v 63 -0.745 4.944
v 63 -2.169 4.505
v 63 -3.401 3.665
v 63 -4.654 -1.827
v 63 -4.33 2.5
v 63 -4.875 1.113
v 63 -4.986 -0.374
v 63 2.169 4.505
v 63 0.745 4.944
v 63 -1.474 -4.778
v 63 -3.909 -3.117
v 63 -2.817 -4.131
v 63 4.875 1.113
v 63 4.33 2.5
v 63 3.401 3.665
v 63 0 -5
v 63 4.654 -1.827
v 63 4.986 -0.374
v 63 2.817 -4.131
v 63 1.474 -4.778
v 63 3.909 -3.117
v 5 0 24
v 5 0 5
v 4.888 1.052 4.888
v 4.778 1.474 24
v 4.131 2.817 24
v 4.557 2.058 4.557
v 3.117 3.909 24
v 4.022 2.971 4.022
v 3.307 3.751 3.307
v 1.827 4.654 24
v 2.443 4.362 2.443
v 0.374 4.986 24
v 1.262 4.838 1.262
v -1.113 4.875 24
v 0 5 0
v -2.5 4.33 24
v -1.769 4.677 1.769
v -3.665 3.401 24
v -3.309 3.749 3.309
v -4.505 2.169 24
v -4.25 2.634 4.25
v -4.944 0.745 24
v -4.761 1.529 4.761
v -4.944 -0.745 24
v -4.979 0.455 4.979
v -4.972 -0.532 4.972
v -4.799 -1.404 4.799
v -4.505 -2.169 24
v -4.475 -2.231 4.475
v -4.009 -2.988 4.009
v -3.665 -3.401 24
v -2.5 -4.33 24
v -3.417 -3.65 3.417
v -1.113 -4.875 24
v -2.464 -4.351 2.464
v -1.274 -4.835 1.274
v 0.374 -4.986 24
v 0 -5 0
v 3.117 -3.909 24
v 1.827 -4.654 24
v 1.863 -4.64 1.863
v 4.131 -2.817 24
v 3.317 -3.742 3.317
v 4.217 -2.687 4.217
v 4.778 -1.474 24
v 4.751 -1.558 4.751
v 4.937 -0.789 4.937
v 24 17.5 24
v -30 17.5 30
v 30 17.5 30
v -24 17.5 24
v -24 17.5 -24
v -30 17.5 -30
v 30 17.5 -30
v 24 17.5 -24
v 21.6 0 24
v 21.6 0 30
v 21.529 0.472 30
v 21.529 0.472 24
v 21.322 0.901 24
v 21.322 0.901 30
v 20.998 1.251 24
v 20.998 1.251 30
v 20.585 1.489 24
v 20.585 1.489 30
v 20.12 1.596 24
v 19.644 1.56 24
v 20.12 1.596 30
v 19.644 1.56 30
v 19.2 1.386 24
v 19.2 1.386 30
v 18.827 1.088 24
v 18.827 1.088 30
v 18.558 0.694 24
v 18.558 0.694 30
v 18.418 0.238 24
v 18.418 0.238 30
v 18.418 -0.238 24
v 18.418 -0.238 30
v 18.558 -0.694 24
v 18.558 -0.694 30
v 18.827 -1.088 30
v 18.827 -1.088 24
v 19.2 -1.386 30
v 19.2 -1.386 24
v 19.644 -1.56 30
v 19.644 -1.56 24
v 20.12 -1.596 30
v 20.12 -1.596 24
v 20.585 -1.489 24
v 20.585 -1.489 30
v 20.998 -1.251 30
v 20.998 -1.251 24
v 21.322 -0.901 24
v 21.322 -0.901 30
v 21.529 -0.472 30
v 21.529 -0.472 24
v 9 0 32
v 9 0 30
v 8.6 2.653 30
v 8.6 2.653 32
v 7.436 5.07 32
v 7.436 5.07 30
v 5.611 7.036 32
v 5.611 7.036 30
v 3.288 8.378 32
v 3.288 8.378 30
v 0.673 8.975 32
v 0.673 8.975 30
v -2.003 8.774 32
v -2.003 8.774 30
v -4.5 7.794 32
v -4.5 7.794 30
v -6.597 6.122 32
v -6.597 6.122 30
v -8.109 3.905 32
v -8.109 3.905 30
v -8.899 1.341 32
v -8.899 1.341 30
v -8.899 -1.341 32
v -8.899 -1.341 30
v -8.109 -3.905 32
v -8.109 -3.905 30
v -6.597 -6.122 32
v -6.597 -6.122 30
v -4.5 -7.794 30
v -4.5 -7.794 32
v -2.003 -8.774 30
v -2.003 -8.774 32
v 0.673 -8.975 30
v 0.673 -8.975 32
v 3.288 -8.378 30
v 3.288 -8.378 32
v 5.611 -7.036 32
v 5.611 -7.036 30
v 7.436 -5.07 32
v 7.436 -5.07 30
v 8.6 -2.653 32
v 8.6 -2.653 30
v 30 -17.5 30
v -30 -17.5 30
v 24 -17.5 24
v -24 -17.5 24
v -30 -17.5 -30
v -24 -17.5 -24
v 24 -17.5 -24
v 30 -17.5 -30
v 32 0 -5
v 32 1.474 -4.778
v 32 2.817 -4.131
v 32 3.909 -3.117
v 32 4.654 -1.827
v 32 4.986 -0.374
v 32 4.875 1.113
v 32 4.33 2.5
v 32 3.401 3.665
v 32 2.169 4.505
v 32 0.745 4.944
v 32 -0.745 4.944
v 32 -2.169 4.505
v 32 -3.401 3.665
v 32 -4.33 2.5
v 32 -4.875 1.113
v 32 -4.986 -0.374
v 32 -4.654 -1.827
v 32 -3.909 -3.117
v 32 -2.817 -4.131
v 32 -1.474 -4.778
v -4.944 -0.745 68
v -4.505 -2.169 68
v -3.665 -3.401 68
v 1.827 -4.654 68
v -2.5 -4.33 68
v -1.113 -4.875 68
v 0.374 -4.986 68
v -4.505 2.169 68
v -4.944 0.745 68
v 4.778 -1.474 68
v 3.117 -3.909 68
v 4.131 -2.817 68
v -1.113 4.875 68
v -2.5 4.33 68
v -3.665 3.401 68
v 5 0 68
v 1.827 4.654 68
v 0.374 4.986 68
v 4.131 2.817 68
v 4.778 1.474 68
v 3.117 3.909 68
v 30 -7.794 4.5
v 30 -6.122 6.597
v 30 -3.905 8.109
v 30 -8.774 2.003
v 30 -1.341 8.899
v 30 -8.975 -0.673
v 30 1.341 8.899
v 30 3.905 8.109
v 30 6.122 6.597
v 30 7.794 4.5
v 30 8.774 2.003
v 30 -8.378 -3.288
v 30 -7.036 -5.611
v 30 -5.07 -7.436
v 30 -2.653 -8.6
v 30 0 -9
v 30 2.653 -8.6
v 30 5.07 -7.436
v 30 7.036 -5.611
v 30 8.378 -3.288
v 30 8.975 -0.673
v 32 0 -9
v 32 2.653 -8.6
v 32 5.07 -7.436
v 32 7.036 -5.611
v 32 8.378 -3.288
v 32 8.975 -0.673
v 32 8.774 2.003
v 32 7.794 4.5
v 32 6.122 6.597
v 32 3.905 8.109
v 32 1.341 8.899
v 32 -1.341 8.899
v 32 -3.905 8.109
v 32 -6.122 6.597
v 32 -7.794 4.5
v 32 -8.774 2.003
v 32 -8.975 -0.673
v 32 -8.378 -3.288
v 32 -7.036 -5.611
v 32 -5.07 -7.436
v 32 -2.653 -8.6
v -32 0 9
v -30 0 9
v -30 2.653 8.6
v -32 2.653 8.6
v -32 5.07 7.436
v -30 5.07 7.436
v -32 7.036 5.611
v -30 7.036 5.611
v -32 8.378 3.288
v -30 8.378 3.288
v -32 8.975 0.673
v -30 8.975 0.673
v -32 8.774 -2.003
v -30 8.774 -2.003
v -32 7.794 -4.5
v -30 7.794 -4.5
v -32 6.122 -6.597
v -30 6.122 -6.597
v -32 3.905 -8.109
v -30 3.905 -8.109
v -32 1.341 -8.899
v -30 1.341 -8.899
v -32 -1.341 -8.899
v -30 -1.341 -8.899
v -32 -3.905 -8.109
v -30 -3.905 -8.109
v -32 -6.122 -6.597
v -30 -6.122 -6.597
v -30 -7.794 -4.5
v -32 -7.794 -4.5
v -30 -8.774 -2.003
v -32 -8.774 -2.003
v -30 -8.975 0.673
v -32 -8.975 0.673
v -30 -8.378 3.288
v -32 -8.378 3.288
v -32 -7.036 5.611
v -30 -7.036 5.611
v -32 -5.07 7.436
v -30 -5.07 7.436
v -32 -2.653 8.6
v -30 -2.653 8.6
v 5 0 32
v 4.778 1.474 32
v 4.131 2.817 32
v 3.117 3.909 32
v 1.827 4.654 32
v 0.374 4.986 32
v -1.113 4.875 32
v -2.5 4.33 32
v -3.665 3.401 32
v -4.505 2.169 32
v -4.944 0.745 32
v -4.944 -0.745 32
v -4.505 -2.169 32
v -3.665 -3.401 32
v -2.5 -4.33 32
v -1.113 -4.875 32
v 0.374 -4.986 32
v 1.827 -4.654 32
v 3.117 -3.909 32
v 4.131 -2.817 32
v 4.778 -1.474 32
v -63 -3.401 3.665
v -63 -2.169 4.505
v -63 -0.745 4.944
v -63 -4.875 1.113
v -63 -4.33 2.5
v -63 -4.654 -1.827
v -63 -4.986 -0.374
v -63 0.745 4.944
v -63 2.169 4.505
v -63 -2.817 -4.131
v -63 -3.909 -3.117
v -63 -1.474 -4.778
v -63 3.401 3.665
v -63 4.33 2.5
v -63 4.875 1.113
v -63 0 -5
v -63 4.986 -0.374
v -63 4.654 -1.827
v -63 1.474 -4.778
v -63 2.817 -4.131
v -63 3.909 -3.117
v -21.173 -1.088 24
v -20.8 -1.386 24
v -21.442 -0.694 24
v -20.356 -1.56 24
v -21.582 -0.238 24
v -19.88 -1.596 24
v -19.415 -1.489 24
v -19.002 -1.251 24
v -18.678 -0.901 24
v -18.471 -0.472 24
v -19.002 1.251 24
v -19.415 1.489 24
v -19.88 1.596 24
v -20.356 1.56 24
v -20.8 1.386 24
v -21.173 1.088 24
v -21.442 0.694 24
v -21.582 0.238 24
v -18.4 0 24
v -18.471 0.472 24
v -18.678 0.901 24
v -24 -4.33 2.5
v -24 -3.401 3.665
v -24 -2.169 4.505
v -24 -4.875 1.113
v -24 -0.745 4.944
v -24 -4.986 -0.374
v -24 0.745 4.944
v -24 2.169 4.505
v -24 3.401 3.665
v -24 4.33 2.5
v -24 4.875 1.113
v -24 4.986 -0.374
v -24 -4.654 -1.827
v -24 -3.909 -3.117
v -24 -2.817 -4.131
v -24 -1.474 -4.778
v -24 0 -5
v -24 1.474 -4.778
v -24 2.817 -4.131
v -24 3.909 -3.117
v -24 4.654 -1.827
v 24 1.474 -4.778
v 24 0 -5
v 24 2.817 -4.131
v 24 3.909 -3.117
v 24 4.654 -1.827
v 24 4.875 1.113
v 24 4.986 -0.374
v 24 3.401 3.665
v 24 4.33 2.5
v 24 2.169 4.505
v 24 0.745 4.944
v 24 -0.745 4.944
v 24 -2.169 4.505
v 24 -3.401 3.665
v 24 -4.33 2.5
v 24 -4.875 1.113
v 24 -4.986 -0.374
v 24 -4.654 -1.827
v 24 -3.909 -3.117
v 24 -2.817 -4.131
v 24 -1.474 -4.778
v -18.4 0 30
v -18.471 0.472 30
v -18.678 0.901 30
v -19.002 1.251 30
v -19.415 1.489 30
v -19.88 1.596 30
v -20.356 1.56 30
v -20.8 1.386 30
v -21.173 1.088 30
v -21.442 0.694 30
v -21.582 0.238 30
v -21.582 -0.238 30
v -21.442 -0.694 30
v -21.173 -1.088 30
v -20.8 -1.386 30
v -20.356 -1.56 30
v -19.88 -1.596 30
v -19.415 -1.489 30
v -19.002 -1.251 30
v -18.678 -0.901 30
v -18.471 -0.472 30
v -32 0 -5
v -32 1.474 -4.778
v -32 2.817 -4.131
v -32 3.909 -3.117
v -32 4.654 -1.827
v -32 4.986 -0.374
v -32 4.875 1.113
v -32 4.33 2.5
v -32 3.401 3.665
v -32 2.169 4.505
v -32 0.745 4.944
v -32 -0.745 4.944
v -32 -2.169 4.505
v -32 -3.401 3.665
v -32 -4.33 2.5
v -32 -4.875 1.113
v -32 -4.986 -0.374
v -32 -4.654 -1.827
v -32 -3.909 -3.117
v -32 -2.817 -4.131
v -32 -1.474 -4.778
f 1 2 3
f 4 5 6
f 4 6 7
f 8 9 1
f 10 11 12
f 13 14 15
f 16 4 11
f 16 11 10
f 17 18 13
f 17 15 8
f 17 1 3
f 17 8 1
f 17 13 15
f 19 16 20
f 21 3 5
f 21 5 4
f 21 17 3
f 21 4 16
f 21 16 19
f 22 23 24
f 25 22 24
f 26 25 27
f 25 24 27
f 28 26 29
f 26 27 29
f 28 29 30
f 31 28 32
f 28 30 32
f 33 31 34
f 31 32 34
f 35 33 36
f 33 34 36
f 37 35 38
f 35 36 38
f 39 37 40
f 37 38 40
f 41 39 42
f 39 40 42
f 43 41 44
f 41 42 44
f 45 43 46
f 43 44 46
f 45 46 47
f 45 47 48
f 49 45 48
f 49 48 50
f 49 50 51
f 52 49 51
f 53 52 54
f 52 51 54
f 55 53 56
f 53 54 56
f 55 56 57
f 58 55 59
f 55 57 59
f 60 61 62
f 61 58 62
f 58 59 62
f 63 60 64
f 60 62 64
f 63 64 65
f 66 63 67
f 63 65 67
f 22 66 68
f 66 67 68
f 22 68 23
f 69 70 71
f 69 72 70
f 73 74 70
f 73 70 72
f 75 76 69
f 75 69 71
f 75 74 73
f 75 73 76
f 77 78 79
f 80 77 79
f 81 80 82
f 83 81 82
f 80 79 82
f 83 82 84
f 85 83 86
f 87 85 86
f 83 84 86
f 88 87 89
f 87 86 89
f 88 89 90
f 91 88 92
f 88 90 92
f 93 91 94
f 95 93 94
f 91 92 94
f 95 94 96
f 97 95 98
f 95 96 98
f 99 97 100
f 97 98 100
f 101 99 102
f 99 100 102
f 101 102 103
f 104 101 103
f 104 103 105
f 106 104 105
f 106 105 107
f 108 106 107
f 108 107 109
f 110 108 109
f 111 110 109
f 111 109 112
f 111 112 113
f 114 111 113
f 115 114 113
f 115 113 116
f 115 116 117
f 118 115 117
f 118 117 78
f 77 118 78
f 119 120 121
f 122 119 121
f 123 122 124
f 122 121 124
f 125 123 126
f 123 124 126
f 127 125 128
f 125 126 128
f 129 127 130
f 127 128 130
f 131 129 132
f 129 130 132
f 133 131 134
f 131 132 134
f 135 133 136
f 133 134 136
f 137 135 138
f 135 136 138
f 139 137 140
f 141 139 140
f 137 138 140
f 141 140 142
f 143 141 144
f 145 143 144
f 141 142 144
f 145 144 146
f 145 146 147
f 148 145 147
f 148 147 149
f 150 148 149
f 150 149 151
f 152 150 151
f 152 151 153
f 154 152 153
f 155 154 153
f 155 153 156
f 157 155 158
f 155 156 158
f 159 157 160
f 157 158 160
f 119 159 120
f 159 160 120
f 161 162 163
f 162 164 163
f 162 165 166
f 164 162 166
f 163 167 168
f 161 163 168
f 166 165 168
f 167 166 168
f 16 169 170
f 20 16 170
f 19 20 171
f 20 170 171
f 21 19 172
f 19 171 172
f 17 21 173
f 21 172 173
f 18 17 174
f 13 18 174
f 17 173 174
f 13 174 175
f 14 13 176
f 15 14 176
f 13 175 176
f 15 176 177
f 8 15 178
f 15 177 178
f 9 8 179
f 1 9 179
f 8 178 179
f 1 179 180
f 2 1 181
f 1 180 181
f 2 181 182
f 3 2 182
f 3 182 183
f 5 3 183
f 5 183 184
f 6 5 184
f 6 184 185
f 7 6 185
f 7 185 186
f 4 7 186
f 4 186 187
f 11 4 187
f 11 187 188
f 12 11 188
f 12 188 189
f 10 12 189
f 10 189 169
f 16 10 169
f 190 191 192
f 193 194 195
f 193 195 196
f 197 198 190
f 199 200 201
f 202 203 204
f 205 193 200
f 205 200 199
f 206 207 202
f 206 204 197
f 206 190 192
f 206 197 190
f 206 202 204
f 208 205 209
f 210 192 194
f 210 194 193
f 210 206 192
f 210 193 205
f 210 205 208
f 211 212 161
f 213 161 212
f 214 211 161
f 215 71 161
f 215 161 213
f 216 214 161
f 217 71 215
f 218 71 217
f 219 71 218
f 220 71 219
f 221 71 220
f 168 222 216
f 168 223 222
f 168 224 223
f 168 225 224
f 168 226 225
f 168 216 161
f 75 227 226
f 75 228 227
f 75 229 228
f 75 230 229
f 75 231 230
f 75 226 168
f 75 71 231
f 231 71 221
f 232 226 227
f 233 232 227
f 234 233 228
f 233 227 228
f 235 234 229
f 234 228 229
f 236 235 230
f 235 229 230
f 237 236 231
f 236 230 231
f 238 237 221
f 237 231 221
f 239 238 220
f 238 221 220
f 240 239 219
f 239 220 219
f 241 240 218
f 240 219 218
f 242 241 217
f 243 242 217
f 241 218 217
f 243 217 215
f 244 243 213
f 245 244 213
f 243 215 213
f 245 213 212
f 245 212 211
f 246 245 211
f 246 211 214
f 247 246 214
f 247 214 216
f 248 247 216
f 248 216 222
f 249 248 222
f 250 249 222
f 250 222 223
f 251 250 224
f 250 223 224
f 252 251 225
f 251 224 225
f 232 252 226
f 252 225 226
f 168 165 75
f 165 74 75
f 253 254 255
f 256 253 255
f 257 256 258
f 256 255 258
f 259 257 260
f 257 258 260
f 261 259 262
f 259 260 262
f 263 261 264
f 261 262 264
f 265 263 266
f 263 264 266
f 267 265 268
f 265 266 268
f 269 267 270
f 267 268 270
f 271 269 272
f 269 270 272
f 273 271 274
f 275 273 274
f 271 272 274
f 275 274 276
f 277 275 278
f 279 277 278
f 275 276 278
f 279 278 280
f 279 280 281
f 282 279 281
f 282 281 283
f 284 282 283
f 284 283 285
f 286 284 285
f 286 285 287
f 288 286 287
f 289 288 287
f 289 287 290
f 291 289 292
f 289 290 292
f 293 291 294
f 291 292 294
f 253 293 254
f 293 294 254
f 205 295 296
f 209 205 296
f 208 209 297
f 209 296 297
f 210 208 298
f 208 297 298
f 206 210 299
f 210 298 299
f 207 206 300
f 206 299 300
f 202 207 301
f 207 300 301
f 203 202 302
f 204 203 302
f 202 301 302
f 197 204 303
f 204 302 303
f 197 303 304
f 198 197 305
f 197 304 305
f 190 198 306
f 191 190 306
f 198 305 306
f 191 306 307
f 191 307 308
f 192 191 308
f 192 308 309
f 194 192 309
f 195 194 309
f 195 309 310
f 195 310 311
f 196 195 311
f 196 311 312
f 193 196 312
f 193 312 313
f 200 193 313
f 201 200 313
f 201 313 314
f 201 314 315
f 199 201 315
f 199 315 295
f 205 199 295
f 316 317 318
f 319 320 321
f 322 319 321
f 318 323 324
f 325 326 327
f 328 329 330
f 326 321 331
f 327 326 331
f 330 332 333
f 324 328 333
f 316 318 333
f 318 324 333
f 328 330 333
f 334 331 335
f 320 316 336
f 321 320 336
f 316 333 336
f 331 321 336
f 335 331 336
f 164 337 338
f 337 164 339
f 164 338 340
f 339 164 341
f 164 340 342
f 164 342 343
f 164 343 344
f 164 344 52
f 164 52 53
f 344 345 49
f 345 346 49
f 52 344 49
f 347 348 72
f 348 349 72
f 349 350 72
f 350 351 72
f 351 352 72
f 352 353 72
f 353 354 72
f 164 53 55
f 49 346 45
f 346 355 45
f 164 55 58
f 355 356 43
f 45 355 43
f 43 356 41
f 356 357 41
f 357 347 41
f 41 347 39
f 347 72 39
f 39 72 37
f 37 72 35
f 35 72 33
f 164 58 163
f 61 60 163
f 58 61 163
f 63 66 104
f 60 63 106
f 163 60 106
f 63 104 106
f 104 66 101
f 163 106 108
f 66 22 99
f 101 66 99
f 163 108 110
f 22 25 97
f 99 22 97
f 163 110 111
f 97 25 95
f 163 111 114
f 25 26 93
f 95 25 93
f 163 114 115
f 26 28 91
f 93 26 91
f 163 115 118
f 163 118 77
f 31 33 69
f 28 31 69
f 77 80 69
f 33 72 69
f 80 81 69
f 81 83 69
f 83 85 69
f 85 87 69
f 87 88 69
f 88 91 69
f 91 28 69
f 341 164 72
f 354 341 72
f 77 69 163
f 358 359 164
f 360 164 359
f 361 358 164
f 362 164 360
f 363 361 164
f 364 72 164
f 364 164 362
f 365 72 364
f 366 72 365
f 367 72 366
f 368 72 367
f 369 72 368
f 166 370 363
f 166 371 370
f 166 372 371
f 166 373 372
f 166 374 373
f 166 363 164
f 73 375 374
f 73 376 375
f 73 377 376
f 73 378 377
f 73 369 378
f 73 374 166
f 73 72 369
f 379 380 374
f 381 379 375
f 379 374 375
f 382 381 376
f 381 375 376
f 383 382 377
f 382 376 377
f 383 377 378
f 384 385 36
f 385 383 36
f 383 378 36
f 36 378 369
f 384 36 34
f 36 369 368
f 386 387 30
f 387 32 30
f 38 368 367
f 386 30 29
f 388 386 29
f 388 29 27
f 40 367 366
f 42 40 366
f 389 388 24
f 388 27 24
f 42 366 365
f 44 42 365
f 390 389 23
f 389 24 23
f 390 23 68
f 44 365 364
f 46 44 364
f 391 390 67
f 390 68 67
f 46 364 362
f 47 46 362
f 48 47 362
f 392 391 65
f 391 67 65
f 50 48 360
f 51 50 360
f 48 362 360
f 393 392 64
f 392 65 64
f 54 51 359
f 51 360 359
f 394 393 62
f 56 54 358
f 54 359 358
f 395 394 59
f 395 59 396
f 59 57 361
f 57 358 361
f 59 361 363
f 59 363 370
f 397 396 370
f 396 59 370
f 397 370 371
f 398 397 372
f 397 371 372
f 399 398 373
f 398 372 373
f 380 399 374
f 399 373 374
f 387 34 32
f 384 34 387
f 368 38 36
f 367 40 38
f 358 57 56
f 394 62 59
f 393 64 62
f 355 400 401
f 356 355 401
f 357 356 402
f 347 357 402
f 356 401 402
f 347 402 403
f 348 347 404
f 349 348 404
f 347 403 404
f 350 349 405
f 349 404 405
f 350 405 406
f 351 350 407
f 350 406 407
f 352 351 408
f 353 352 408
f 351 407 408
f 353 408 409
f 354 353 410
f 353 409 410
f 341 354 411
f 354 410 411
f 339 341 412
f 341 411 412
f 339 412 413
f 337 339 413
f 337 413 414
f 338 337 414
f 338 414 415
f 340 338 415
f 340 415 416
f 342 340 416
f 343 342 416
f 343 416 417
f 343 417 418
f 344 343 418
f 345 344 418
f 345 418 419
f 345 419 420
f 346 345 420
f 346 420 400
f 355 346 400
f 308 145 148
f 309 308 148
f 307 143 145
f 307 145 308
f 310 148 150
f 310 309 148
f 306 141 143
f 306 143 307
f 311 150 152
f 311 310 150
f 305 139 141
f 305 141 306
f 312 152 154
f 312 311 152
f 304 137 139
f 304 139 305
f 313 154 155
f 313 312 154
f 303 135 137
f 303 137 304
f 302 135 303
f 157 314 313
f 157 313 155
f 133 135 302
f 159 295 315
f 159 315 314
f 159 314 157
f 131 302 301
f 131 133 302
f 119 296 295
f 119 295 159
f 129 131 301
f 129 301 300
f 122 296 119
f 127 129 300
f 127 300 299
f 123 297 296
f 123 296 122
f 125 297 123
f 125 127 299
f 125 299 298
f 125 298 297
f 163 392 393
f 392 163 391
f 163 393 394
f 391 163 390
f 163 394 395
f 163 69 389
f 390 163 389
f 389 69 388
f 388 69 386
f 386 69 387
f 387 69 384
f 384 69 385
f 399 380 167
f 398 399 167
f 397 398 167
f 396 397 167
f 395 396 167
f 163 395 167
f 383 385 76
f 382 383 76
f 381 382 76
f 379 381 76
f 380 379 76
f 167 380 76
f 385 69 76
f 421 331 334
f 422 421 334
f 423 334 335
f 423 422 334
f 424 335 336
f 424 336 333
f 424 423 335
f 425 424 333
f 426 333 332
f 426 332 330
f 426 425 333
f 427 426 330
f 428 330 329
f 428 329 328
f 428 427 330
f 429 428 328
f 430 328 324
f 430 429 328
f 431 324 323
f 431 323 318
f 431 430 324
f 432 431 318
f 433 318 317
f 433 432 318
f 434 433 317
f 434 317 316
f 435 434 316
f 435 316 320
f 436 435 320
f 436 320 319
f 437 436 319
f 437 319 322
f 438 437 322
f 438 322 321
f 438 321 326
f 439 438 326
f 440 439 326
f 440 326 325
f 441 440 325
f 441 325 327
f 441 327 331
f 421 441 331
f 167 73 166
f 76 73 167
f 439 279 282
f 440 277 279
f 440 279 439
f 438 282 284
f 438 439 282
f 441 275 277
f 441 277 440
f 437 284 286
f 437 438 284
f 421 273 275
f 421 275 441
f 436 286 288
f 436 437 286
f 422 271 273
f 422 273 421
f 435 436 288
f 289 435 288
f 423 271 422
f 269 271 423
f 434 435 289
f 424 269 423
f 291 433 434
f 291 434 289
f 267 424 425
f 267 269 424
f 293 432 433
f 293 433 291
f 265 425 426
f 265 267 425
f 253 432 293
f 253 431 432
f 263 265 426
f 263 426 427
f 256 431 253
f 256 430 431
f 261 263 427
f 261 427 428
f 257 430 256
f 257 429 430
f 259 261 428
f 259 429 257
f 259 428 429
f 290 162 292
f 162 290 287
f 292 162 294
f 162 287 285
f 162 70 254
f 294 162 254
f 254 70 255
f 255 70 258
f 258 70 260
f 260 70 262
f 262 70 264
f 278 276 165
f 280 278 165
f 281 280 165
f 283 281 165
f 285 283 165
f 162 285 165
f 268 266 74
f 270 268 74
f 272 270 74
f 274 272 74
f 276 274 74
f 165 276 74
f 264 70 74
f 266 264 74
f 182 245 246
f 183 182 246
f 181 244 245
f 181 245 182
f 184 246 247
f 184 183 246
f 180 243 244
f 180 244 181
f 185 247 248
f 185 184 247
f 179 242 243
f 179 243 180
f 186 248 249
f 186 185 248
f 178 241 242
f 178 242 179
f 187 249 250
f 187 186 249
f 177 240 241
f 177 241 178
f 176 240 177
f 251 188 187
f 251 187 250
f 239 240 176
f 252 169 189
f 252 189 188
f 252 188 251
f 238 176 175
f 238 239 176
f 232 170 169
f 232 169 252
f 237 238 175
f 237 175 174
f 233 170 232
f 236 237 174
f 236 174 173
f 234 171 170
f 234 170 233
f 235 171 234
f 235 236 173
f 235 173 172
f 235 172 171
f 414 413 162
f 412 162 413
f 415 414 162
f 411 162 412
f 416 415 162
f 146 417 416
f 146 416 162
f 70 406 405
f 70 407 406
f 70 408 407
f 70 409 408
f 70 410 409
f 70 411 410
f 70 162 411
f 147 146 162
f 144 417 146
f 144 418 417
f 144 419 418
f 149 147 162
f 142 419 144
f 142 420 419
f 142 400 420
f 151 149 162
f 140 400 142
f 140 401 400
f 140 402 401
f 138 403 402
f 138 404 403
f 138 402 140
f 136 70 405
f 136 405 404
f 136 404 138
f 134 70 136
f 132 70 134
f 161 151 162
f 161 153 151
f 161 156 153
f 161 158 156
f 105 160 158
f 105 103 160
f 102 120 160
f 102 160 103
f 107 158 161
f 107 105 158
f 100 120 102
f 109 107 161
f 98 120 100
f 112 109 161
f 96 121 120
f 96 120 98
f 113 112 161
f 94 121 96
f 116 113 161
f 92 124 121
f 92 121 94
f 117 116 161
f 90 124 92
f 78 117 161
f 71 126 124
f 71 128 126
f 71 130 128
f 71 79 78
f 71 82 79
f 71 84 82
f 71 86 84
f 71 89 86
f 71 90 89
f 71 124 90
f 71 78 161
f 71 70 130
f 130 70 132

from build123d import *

# Parameters (mm, degrees)
SALIENTE_EXTRUIR1_DEPTH      = 17.5
SALIENTE_EXTRUIR1_DEPTH_BACK = 17.5
CROQUIS1_W                   = 60
CROQUIS1_H                   = 60
CROQUIS1_W_2                 = 48
CROQUIS1_H_2                 = 48
CROQUIS2_R                   = 9
SALIENTE_EXTRUIR2_DEPTH      = 2
CROQUIS3_R                   = 9
SALIENTE_EXTRUIR3_DEPTH      = 2
SALIENTE_EXTRUIR4_START      = 2
CROQUIS4_R                   = 9
SALIENTE_EXTRUIR4_DEPTH      = 2
SALIENTE_EXTRUIR5_DEPTH      = 63
SALIENTE_EXTRUIR5_DEPTH_BACK = 63
CROQUIS5_R                   = 5
CROQUIS6_R                   = 5
SALIENTE_EXTRUIR6_DEPTH      = 68
CUT_EXTRUDE1_REACH           = 90.743
SKETCH1_R                    = 1.6


with BuildPart() as part:
    # Croquis1 → Saliente-Extruir1 (new, two sides: drawn at the far end of the back side and taken through both)
    with BuildSketch(Plane(origin=(0, 0, 0), x_dir=(1, 0, 0), z_dir=(0, 1, 0)).offset(-SALIENTE_EXTRUIR1_DEPTH_BACK)):
        Rectangle(CROQUIS1_W, CROQUIS1_H)
        Rectangle(CROQUIS1_W_2, CROQUIS1_H_2, mode=Mode.SUBTRACT)
    extrude(amount=SALIENTE_EXTRUIR1_DEPTH + SALIENTE_EXTRUIR1_DEPTH_BACK)

    # Croquis2 → Saliente-Extruir2 (add)
    with BuildSketch(Plane.XY.offset(30)):
        Circle(CROQUIS2_R)
    extrude(amount=SALIENTE_EXTRUIR2_DEPTH)

    # Croquis3 → Saliente-Extruir3 (add)
    with BuildSketch(Plane(origin=(30, 0, 0), x_dir=(0, 0, -1), z_dir=(1, 0, 0))):
        Circle(CROQUIS3_R)
    extrude(amount=SALIENTE_EXTRUIR3_DEPTH)

    # Croquis4 → Saliente-Extruir4 (add)
    with BuildSketch(Plane.ZY.offset(30).offset(SALIENTE_EXTRUIR4_START)):
        Circle(CROQUIS4_R)
    extrude(amount=-SALIENTE_EXTRUIR4_DEPTH)

    # Croquis5 → Saliente-Extruir5 (add, two sides: drawn at the far end of the back side and taken through both)
    with BuildSketch(Plane(origin=(0, 0, 0), x_dir=(0, 0, -1), z_dir=(1, 0, 0)).offset(-SALIENTE_EXTRUIR5_DEPTH_BACK)):
        Circle(CROQUIS5_R)
    extrude(amount=SALIENTE_EXTRUIR5_DEPTH + SALIENTE_EXTRUIR5_DEPTH_BACK)

    # Croquis6 → Saliente-Extruir6 (add)
    with BuildSketch(Plane.XY):
        Circle(CROQUIS6_R)
    extrude(amount=SALIENTE_EXTRUIR6_DEPTH)

    # Sketch1 → Cut-Extrude1 (cut, up to next)
    with BuildSketch(Plane.XY.offset(30), mode=Mode.PRIVATE) as cut_extrude1_sk1:
        with Locations((-20, 0)):
            Circle(SKETCH1_R)
    cut_extrude1_tool1 = extrude(cut_extrude1_sk1.sketch, amount=-CUT_EXTRUDE1_REACH, mode=Mode.PRIVATE) & part.part
    # Sketch1 → Cut-Extrude1 (cut, up to next)
    with BuildSketch(Plane.XY.offset(30), mode=Mode.PRIVATE) as cut_extrude1_sk2:
        with Locations((20, 0)):
            Circle(SKETCH1_R)
    cut_extrude1_tool2 = extrude(cut_extrude1_sk2.sketch, amount=-CUT_EXTRUDE1_REACH, mode=Mode.PRIVATE) & part.part
    add(cut_extrude1_tool1.solids().sort_by_distance((-20, 0, 30))[0], mode=Mode.SUBTRACT)
    add(cut_extrude1_tool2.solids().sort_by_distance((20, 0, 30))[0], mode=Mode.SUBTRACT)


solid = part.part
